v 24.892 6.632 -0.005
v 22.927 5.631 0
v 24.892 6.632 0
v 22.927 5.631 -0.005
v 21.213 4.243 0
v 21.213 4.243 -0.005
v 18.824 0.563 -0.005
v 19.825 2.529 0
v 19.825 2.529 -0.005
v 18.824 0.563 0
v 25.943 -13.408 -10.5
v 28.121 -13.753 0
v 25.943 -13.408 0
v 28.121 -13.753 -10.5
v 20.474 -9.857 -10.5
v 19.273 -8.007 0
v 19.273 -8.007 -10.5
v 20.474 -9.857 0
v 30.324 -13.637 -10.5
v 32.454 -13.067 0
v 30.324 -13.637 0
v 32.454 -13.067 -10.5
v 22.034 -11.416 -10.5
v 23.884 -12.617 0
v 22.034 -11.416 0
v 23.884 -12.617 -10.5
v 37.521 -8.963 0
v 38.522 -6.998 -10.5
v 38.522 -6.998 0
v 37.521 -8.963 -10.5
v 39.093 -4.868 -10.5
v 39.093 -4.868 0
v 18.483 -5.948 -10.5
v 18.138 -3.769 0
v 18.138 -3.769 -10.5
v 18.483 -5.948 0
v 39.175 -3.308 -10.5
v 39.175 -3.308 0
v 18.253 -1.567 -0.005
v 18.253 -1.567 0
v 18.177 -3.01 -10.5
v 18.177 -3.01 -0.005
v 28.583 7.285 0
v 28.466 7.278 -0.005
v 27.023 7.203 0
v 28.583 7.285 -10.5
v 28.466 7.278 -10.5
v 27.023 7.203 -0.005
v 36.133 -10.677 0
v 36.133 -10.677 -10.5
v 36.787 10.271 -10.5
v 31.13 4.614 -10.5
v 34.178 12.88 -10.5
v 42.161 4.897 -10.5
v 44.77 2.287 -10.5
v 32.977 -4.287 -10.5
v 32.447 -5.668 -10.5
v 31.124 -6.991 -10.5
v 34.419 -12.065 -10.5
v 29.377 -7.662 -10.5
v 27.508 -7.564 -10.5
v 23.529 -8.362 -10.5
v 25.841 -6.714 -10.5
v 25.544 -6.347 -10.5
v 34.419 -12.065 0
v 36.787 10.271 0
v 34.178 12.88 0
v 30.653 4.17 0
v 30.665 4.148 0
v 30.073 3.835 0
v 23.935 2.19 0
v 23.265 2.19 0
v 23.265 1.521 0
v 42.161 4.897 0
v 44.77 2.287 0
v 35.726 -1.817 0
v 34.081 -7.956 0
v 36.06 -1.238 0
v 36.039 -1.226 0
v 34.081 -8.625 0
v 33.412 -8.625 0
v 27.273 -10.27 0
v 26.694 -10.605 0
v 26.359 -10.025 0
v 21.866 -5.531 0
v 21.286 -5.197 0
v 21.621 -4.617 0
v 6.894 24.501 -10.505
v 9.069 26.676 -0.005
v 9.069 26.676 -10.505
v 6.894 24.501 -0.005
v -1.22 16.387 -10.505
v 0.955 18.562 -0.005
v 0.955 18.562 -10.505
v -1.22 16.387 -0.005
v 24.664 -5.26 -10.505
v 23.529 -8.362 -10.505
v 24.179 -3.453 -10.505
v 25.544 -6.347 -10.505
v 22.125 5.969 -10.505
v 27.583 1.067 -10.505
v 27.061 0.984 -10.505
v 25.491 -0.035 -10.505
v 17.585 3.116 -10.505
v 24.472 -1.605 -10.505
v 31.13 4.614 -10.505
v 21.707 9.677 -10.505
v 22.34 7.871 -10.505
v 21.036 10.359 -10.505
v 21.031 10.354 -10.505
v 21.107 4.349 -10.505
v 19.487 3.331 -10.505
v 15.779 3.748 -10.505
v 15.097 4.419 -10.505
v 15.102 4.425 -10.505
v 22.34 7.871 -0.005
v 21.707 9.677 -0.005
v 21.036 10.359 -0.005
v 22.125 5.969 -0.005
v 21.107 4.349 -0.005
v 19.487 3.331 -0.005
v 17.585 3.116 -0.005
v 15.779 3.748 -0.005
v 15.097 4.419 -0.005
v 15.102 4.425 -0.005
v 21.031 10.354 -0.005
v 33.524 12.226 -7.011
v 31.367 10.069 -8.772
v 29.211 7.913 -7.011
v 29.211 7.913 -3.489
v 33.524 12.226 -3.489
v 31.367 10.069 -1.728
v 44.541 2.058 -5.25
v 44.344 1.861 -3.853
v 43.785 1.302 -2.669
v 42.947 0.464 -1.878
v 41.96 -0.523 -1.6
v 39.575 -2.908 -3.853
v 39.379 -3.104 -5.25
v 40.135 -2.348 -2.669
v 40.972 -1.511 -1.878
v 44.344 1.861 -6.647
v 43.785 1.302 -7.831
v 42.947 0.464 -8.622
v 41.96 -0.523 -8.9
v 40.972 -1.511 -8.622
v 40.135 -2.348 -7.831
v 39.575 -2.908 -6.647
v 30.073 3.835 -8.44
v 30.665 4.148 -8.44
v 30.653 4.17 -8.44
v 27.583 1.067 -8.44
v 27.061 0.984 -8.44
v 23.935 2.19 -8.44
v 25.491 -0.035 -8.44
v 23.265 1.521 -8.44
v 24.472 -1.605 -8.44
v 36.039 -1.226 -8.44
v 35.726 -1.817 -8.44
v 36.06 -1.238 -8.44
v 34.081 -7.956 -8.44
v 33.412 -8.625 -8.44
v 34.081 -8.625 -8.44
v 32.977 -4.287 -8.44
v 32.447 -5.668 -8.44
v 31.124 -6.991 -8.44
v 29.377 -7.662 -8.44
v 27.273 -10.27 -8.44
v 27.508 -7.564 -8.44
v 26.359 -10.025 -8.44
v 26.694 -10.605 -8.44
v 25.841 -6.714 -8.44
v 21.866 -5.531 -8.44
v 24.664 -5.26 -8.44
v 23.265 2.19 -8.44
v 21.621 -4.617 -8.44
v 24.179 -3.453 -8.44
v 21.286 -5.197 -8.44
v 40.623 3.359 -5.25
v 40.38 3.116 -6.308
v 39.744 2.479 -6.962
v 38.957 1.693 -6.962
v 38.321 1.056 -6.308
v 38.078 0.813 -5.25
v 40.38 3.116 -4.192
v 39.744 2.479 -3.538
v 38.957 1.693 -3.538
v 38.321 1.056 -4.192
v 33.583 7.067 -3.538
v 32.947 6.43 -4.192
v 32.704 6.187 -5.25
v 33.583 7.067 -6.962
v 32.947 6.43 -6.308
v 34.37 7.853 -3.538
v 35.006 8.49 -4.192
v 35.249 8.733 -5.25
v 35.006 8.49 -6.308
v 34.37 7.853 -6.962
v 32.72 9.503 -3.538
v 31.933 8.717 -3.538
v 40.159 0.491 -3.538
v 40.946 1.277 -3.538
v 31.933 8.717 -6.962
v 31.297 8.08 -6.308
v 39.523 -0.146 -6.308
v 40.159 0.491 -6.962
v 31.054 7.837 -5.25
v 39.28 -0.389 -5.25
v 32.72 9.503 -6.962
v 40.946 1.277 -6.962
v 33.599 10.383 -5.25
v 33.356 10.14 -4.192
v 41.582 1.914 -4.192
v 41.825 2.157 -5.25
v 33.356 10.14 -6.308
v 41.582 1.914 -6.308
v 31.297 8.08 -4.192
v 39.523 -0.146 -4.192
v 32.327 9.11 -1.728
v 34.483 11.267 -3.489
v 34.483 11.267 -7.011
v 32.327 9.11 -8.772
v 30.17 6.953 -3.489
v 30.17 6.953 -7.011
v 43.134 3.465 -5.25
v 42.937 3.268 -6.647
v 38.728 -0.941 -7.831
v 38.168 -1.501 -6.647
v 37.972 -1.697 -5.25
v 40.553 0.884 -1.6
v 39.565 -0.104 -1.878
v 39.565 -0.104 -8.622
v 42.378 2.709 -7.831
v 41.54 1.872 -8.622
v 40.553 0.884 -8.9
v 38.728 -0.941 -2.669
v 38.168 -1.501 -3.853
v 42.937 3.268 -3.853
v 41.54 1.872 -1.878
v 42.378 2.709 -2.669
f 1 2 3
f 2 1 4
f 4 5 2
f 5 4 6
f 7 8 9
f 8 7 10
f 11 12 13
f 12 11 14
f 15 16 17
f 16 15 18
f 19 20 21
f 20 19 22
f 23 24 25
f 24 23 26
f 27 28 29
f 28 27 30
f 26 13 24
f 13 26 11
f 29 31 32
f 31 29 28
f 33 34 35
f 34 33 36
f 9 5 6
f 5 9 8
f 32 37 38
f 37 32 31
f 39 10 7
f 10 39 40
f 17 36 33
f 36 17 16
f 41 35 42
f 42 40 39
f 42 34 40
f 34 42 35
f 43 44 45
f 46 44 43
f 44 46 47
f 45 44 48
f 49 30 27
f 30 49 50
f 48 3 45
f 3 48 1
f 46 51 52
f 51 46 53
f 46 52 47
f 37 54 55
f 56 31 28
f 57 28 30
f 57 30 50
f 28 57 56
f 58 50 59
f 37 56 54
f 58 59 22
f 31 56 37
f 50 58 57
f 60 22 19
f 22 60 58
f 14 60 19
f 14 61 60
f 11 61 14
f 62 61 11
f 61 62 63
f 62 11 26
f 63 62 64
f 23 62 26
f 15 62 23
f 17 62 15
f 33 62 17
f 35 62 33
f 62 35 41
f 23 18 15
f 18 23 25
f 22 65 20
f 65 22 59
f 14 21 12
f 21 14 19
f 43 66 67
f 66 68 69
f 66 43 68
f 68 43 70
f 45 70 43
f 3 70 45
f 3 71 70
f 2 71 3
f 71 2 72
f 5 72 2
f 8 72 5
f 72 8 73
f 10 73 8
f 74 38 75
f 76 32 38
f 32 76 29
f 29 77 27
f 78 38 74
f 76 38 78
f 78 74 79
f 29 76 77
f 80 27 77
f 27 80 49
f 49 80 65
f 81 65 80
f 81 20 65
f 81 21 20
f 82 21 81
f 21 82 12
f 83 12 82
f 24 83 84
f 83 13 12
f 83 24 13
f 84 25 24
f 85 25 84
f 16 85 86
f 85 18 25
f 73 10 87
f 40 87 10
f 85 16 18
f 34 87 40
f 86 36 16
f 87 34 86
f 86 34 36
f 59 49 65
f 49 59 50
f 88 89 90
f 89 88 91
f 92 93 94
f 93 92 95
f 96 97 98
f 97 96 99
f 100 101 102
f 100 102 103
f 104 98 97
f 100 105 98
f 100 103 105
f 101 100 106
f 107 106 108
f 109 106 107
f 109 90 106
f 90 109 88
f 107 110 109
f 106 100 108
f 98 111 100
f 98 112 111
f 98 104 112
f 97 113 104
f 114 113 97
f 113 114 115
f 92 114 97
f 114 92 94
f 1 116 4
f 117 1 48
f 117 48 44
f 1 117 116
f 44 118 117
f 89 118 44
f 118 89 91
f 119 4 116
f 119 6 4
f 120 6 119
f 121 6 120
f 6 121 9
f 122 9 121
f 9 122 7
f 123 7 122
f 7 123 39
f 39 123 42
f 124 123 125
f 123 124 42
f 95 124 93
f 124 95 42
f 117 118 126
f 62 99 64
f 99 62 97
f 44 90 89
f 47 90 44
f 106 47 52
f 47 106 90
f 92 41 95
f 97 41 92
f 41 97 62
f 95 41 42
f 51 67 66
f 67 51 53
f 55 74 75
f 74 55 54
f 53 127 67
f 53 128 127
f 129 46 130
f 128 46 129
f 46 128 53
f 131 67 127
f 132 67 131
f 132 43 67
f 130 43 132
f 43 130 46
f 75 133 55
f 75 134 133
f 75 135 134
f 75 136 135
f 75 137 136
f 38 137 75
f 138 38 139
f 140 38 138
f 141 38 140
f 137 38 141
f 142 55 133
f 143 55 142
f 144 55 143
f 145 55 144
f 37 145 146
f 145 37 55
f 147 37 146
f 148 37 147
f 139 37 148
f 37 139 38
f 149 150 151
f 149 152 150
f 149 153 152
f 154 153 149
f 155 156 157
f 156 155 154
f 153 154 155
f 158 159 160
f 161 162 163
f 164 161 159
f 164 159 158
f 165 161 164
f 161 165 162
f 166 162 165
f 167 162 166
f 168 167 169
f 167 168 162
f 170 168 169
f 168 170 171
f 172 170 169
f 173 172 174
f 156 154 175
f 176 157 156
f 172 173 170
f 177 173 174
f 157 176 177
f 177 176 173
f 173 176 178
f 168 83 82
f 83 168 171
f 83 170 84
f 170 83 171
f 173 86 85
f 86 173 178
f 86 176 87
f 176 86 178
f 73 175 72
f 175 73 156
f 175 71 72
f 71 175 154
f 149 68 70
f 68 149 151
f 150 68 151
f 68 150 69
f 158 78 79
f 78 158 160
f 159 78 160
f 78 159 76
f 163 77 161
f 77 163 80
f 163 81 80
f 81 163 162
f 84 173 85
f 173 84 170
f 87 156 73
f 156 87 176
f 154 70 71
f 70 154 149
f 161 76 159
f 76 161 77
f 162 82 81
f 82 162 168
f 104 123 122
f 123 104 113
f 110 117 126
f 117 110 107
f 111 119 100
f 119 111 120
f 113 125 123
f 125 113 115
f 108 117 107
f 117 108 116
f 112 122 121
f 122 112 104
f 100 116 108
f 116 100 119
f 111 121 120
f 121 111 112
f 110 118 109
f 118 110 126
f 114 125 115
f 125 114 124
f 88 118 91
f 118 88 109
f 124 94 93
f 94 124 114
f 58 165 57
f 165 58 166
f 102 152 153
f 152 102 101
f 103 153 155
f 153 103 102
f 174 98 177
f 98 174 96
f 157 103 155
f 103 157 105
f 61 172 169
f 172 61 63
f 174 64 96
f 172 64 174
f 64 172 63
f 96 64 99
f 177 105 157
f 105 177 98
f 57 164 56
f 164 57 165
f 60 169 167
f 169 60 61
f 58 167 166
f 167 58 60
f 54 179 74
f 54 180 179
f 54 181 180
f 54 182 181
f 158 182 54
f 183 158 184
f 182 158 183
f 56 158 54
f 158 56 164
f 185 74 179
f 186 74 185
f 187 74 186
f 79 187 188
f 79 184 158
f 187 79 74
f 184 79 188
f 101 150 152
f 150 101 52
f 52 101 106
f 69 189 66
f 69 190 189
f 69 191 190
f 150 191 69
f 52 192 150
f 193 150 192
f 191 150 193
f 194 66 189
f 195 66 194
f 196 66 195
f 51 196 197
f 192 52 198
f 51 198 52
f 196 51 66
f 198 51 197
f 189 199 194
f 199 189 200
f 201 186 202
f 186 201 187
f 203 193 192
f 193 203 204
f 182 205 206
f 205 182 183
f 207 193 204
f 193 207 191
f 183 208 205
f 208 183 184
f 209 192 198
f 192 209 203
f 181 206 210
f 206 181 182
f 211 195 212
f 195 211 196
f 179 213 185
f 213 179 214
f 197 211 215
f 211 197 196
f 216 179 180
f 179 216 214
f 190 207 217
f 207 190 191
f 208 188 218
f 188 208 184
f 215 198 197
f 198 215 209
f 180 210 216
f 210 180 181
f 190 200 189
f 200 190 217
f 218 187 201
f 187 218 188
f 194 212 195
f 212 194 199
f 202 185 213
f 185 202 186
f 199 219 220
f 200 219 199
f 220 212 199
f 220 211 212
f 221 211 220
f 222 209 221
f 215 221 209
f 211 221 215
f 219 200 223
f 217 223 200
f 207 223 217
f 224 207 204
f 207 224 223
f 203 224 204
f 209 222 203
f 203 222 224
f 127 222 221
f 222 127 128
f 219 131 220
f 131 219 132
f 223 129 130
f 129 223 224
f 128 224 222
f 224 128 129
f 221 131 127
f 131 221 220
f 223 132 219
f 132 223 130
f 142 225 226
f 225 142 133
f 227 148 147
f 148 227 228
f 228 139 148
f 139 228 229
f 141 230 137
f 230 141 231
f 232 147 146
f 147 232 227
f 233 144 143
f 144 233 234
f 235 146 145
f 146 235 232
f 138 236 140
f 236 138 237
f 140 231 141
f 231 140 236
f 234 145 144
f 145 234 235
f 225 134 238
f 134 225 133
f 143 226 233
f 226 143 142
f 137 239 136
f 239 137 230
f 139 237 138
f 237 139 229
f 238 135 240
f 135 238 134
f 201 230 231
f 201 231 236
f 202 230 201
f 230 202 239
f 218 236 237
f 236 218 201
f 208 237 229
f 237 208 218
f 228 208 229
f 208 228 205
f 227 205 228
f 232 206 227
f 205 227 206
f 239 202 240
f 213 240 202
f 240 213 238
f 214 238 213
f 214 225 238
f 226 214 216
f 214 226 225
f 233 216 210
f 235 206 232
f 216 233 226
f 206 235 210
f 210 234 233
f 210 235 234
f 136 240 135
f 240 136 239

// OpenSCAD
/*
 * Z Isolator with Securing nut
 *
 * (C) Michel Pollet <buserror@gmail.com>
 *
This is a redesign of http://www.thingiverse.com/thing:20147
That existing piece does the job for constant (increasing)
Z movement, however it fails to control any backlash for the
Z nut when doing the Z calibration phase and also when using
"Lift between moves" in Slic3r or Repsnapper.

This version is parametric, and has a captured M3 captured nut
to make sure the M8 nut is held in place. The smooth rod
arms are suposed to be 'snug' too, having them slack will add
backlash again.

The original piece functionality is still there, wich is to 
make sure the X carriages are decoupled from the Z axis, 
preventing very successfuly the "Z wobble" when the threaded
rods move jerk the X carriage back/forth.

As an added bonus, making sure the Z nut is secured prevents
accidents if you lower the head 'under' the bed... If you
do this on a normal prusa, the nut exits it's housing and 
you have to re-level the whole bed.
 */

// change this to 1 to get the screw tighener on the side
ScrewOnSide = 1;

NutR = 12.9 / 2;
NutH = 6.40;
RodR = (7.6 / 2);
SRodR = 8.4 / 2;
WallW = 4.1;
E = 0.01;

GuideL = 35;
GuideW = (SRodR * 2) + (WallW * 1.5);

ScrewL = 10;
ScrewW = (RodR * 2) + (WallW * 1.8);
ScrewNutR = 6.1 / 2;
ScrewNutH = 2;
ScrewThreadR = 3.6 / 2;
ScrewWasheR = 7.3 / 2;
ScrewNutInset = WallW / 3;
ScrewWasherInset = 2;

rotate(-45,0,0) {
//	rotate([180,0,0])
//		zizolator();
	translate([GuideL-NutR-ScrewL+1+(ScrewOnSide*3), 18, 0])
		rotate([0,180,0])
			zizolator();
}

module zizolator() {
	difference() {
		union() {
			cylinder(r = WallW + NutR, h = NutH + WallW);
			
			translate([GuideL / 2, 0, (NutH + WallW + E) / 2])	
				cube([GuideL, GuideW, NutH + WallW], center = true);
		
			rotate([0,0,-90 * ScrewOnSide])
			translate([-(((NutR+WallW)/2) + ScrewL), -(ScrewW/2), 0])
				cube([ScrewL, ScrewW, NutH + WallW]);		
		}
		translate([0,0,-E]) {
			nut(d = (NutR) * 2, h = NutH + (WallW/2), horizontal=true);
			cylinder(r = SRodR + 0.3, h = NutH + (2*WallW));
		
			rotate([0,0,-90 * ScrewOnSide])
			translate([-20, -RodR, 0])
				cube([20, RodR*2, NutH + (2*WallW)]);
		
			translate([15, 0, 0]) {
				cylinder(r = SRodR + 0.1, h = NutH + (2*WallW));
				translate([0, -SRodR, 0])
					cube([GuideL, SRodR*2, NutH + (2*WallW)]);
			}
		}
		rotate([0,0,-90 * ScrewOnSide])
		translate([-ScrewL-ScrewThreadR+0.5, 0, (NutH + WallW)/ 2]) {
			translate([0,(NutR * 1.5),0])
				rotate([90,00,0])
					cylinder(h = (NutR * 3), r = ScrewThreadR, $fn = 10);
			translate([0,ScrewNutInset+(ScrewW/2)+E,0])
				rotate([90,30,0])
					nut(h = ScrewNutInset*2, d = ScrewNutR*2, horizontal=false);
			translate([0,-(ScrewW/2)+ScrewWasherInset-E,0])
				rotate([90,00,0])
					cylinder(h = ScrewWasherInset*2, r = ScrewWasheR, $fn = 16);
		}
	}
}


// PRUSA Mendel  
// Functions used in many files
// GNU GPL v3
// Josef Průša
// josefprusa@me.com
// prusadjs.cz
// http://www.reprap.org/wiki/Prusa_Mendel
// http://github.com/prusajr/PrusaMendel


module nut(d,h,horizontal=true){
cornerdiameter =  (d / 2) / cos (180 / 6);
cylinder(h = h, r = cornerdiameter, $fn = 6);
if(horizontal){
for(i = [1:6]){
	rotate([0,0,60*i]) translate([-cornerdiameter-0.2,0,0]) rotate([0,0,-45]) cube(size = [2,2,h]);
}}
}
